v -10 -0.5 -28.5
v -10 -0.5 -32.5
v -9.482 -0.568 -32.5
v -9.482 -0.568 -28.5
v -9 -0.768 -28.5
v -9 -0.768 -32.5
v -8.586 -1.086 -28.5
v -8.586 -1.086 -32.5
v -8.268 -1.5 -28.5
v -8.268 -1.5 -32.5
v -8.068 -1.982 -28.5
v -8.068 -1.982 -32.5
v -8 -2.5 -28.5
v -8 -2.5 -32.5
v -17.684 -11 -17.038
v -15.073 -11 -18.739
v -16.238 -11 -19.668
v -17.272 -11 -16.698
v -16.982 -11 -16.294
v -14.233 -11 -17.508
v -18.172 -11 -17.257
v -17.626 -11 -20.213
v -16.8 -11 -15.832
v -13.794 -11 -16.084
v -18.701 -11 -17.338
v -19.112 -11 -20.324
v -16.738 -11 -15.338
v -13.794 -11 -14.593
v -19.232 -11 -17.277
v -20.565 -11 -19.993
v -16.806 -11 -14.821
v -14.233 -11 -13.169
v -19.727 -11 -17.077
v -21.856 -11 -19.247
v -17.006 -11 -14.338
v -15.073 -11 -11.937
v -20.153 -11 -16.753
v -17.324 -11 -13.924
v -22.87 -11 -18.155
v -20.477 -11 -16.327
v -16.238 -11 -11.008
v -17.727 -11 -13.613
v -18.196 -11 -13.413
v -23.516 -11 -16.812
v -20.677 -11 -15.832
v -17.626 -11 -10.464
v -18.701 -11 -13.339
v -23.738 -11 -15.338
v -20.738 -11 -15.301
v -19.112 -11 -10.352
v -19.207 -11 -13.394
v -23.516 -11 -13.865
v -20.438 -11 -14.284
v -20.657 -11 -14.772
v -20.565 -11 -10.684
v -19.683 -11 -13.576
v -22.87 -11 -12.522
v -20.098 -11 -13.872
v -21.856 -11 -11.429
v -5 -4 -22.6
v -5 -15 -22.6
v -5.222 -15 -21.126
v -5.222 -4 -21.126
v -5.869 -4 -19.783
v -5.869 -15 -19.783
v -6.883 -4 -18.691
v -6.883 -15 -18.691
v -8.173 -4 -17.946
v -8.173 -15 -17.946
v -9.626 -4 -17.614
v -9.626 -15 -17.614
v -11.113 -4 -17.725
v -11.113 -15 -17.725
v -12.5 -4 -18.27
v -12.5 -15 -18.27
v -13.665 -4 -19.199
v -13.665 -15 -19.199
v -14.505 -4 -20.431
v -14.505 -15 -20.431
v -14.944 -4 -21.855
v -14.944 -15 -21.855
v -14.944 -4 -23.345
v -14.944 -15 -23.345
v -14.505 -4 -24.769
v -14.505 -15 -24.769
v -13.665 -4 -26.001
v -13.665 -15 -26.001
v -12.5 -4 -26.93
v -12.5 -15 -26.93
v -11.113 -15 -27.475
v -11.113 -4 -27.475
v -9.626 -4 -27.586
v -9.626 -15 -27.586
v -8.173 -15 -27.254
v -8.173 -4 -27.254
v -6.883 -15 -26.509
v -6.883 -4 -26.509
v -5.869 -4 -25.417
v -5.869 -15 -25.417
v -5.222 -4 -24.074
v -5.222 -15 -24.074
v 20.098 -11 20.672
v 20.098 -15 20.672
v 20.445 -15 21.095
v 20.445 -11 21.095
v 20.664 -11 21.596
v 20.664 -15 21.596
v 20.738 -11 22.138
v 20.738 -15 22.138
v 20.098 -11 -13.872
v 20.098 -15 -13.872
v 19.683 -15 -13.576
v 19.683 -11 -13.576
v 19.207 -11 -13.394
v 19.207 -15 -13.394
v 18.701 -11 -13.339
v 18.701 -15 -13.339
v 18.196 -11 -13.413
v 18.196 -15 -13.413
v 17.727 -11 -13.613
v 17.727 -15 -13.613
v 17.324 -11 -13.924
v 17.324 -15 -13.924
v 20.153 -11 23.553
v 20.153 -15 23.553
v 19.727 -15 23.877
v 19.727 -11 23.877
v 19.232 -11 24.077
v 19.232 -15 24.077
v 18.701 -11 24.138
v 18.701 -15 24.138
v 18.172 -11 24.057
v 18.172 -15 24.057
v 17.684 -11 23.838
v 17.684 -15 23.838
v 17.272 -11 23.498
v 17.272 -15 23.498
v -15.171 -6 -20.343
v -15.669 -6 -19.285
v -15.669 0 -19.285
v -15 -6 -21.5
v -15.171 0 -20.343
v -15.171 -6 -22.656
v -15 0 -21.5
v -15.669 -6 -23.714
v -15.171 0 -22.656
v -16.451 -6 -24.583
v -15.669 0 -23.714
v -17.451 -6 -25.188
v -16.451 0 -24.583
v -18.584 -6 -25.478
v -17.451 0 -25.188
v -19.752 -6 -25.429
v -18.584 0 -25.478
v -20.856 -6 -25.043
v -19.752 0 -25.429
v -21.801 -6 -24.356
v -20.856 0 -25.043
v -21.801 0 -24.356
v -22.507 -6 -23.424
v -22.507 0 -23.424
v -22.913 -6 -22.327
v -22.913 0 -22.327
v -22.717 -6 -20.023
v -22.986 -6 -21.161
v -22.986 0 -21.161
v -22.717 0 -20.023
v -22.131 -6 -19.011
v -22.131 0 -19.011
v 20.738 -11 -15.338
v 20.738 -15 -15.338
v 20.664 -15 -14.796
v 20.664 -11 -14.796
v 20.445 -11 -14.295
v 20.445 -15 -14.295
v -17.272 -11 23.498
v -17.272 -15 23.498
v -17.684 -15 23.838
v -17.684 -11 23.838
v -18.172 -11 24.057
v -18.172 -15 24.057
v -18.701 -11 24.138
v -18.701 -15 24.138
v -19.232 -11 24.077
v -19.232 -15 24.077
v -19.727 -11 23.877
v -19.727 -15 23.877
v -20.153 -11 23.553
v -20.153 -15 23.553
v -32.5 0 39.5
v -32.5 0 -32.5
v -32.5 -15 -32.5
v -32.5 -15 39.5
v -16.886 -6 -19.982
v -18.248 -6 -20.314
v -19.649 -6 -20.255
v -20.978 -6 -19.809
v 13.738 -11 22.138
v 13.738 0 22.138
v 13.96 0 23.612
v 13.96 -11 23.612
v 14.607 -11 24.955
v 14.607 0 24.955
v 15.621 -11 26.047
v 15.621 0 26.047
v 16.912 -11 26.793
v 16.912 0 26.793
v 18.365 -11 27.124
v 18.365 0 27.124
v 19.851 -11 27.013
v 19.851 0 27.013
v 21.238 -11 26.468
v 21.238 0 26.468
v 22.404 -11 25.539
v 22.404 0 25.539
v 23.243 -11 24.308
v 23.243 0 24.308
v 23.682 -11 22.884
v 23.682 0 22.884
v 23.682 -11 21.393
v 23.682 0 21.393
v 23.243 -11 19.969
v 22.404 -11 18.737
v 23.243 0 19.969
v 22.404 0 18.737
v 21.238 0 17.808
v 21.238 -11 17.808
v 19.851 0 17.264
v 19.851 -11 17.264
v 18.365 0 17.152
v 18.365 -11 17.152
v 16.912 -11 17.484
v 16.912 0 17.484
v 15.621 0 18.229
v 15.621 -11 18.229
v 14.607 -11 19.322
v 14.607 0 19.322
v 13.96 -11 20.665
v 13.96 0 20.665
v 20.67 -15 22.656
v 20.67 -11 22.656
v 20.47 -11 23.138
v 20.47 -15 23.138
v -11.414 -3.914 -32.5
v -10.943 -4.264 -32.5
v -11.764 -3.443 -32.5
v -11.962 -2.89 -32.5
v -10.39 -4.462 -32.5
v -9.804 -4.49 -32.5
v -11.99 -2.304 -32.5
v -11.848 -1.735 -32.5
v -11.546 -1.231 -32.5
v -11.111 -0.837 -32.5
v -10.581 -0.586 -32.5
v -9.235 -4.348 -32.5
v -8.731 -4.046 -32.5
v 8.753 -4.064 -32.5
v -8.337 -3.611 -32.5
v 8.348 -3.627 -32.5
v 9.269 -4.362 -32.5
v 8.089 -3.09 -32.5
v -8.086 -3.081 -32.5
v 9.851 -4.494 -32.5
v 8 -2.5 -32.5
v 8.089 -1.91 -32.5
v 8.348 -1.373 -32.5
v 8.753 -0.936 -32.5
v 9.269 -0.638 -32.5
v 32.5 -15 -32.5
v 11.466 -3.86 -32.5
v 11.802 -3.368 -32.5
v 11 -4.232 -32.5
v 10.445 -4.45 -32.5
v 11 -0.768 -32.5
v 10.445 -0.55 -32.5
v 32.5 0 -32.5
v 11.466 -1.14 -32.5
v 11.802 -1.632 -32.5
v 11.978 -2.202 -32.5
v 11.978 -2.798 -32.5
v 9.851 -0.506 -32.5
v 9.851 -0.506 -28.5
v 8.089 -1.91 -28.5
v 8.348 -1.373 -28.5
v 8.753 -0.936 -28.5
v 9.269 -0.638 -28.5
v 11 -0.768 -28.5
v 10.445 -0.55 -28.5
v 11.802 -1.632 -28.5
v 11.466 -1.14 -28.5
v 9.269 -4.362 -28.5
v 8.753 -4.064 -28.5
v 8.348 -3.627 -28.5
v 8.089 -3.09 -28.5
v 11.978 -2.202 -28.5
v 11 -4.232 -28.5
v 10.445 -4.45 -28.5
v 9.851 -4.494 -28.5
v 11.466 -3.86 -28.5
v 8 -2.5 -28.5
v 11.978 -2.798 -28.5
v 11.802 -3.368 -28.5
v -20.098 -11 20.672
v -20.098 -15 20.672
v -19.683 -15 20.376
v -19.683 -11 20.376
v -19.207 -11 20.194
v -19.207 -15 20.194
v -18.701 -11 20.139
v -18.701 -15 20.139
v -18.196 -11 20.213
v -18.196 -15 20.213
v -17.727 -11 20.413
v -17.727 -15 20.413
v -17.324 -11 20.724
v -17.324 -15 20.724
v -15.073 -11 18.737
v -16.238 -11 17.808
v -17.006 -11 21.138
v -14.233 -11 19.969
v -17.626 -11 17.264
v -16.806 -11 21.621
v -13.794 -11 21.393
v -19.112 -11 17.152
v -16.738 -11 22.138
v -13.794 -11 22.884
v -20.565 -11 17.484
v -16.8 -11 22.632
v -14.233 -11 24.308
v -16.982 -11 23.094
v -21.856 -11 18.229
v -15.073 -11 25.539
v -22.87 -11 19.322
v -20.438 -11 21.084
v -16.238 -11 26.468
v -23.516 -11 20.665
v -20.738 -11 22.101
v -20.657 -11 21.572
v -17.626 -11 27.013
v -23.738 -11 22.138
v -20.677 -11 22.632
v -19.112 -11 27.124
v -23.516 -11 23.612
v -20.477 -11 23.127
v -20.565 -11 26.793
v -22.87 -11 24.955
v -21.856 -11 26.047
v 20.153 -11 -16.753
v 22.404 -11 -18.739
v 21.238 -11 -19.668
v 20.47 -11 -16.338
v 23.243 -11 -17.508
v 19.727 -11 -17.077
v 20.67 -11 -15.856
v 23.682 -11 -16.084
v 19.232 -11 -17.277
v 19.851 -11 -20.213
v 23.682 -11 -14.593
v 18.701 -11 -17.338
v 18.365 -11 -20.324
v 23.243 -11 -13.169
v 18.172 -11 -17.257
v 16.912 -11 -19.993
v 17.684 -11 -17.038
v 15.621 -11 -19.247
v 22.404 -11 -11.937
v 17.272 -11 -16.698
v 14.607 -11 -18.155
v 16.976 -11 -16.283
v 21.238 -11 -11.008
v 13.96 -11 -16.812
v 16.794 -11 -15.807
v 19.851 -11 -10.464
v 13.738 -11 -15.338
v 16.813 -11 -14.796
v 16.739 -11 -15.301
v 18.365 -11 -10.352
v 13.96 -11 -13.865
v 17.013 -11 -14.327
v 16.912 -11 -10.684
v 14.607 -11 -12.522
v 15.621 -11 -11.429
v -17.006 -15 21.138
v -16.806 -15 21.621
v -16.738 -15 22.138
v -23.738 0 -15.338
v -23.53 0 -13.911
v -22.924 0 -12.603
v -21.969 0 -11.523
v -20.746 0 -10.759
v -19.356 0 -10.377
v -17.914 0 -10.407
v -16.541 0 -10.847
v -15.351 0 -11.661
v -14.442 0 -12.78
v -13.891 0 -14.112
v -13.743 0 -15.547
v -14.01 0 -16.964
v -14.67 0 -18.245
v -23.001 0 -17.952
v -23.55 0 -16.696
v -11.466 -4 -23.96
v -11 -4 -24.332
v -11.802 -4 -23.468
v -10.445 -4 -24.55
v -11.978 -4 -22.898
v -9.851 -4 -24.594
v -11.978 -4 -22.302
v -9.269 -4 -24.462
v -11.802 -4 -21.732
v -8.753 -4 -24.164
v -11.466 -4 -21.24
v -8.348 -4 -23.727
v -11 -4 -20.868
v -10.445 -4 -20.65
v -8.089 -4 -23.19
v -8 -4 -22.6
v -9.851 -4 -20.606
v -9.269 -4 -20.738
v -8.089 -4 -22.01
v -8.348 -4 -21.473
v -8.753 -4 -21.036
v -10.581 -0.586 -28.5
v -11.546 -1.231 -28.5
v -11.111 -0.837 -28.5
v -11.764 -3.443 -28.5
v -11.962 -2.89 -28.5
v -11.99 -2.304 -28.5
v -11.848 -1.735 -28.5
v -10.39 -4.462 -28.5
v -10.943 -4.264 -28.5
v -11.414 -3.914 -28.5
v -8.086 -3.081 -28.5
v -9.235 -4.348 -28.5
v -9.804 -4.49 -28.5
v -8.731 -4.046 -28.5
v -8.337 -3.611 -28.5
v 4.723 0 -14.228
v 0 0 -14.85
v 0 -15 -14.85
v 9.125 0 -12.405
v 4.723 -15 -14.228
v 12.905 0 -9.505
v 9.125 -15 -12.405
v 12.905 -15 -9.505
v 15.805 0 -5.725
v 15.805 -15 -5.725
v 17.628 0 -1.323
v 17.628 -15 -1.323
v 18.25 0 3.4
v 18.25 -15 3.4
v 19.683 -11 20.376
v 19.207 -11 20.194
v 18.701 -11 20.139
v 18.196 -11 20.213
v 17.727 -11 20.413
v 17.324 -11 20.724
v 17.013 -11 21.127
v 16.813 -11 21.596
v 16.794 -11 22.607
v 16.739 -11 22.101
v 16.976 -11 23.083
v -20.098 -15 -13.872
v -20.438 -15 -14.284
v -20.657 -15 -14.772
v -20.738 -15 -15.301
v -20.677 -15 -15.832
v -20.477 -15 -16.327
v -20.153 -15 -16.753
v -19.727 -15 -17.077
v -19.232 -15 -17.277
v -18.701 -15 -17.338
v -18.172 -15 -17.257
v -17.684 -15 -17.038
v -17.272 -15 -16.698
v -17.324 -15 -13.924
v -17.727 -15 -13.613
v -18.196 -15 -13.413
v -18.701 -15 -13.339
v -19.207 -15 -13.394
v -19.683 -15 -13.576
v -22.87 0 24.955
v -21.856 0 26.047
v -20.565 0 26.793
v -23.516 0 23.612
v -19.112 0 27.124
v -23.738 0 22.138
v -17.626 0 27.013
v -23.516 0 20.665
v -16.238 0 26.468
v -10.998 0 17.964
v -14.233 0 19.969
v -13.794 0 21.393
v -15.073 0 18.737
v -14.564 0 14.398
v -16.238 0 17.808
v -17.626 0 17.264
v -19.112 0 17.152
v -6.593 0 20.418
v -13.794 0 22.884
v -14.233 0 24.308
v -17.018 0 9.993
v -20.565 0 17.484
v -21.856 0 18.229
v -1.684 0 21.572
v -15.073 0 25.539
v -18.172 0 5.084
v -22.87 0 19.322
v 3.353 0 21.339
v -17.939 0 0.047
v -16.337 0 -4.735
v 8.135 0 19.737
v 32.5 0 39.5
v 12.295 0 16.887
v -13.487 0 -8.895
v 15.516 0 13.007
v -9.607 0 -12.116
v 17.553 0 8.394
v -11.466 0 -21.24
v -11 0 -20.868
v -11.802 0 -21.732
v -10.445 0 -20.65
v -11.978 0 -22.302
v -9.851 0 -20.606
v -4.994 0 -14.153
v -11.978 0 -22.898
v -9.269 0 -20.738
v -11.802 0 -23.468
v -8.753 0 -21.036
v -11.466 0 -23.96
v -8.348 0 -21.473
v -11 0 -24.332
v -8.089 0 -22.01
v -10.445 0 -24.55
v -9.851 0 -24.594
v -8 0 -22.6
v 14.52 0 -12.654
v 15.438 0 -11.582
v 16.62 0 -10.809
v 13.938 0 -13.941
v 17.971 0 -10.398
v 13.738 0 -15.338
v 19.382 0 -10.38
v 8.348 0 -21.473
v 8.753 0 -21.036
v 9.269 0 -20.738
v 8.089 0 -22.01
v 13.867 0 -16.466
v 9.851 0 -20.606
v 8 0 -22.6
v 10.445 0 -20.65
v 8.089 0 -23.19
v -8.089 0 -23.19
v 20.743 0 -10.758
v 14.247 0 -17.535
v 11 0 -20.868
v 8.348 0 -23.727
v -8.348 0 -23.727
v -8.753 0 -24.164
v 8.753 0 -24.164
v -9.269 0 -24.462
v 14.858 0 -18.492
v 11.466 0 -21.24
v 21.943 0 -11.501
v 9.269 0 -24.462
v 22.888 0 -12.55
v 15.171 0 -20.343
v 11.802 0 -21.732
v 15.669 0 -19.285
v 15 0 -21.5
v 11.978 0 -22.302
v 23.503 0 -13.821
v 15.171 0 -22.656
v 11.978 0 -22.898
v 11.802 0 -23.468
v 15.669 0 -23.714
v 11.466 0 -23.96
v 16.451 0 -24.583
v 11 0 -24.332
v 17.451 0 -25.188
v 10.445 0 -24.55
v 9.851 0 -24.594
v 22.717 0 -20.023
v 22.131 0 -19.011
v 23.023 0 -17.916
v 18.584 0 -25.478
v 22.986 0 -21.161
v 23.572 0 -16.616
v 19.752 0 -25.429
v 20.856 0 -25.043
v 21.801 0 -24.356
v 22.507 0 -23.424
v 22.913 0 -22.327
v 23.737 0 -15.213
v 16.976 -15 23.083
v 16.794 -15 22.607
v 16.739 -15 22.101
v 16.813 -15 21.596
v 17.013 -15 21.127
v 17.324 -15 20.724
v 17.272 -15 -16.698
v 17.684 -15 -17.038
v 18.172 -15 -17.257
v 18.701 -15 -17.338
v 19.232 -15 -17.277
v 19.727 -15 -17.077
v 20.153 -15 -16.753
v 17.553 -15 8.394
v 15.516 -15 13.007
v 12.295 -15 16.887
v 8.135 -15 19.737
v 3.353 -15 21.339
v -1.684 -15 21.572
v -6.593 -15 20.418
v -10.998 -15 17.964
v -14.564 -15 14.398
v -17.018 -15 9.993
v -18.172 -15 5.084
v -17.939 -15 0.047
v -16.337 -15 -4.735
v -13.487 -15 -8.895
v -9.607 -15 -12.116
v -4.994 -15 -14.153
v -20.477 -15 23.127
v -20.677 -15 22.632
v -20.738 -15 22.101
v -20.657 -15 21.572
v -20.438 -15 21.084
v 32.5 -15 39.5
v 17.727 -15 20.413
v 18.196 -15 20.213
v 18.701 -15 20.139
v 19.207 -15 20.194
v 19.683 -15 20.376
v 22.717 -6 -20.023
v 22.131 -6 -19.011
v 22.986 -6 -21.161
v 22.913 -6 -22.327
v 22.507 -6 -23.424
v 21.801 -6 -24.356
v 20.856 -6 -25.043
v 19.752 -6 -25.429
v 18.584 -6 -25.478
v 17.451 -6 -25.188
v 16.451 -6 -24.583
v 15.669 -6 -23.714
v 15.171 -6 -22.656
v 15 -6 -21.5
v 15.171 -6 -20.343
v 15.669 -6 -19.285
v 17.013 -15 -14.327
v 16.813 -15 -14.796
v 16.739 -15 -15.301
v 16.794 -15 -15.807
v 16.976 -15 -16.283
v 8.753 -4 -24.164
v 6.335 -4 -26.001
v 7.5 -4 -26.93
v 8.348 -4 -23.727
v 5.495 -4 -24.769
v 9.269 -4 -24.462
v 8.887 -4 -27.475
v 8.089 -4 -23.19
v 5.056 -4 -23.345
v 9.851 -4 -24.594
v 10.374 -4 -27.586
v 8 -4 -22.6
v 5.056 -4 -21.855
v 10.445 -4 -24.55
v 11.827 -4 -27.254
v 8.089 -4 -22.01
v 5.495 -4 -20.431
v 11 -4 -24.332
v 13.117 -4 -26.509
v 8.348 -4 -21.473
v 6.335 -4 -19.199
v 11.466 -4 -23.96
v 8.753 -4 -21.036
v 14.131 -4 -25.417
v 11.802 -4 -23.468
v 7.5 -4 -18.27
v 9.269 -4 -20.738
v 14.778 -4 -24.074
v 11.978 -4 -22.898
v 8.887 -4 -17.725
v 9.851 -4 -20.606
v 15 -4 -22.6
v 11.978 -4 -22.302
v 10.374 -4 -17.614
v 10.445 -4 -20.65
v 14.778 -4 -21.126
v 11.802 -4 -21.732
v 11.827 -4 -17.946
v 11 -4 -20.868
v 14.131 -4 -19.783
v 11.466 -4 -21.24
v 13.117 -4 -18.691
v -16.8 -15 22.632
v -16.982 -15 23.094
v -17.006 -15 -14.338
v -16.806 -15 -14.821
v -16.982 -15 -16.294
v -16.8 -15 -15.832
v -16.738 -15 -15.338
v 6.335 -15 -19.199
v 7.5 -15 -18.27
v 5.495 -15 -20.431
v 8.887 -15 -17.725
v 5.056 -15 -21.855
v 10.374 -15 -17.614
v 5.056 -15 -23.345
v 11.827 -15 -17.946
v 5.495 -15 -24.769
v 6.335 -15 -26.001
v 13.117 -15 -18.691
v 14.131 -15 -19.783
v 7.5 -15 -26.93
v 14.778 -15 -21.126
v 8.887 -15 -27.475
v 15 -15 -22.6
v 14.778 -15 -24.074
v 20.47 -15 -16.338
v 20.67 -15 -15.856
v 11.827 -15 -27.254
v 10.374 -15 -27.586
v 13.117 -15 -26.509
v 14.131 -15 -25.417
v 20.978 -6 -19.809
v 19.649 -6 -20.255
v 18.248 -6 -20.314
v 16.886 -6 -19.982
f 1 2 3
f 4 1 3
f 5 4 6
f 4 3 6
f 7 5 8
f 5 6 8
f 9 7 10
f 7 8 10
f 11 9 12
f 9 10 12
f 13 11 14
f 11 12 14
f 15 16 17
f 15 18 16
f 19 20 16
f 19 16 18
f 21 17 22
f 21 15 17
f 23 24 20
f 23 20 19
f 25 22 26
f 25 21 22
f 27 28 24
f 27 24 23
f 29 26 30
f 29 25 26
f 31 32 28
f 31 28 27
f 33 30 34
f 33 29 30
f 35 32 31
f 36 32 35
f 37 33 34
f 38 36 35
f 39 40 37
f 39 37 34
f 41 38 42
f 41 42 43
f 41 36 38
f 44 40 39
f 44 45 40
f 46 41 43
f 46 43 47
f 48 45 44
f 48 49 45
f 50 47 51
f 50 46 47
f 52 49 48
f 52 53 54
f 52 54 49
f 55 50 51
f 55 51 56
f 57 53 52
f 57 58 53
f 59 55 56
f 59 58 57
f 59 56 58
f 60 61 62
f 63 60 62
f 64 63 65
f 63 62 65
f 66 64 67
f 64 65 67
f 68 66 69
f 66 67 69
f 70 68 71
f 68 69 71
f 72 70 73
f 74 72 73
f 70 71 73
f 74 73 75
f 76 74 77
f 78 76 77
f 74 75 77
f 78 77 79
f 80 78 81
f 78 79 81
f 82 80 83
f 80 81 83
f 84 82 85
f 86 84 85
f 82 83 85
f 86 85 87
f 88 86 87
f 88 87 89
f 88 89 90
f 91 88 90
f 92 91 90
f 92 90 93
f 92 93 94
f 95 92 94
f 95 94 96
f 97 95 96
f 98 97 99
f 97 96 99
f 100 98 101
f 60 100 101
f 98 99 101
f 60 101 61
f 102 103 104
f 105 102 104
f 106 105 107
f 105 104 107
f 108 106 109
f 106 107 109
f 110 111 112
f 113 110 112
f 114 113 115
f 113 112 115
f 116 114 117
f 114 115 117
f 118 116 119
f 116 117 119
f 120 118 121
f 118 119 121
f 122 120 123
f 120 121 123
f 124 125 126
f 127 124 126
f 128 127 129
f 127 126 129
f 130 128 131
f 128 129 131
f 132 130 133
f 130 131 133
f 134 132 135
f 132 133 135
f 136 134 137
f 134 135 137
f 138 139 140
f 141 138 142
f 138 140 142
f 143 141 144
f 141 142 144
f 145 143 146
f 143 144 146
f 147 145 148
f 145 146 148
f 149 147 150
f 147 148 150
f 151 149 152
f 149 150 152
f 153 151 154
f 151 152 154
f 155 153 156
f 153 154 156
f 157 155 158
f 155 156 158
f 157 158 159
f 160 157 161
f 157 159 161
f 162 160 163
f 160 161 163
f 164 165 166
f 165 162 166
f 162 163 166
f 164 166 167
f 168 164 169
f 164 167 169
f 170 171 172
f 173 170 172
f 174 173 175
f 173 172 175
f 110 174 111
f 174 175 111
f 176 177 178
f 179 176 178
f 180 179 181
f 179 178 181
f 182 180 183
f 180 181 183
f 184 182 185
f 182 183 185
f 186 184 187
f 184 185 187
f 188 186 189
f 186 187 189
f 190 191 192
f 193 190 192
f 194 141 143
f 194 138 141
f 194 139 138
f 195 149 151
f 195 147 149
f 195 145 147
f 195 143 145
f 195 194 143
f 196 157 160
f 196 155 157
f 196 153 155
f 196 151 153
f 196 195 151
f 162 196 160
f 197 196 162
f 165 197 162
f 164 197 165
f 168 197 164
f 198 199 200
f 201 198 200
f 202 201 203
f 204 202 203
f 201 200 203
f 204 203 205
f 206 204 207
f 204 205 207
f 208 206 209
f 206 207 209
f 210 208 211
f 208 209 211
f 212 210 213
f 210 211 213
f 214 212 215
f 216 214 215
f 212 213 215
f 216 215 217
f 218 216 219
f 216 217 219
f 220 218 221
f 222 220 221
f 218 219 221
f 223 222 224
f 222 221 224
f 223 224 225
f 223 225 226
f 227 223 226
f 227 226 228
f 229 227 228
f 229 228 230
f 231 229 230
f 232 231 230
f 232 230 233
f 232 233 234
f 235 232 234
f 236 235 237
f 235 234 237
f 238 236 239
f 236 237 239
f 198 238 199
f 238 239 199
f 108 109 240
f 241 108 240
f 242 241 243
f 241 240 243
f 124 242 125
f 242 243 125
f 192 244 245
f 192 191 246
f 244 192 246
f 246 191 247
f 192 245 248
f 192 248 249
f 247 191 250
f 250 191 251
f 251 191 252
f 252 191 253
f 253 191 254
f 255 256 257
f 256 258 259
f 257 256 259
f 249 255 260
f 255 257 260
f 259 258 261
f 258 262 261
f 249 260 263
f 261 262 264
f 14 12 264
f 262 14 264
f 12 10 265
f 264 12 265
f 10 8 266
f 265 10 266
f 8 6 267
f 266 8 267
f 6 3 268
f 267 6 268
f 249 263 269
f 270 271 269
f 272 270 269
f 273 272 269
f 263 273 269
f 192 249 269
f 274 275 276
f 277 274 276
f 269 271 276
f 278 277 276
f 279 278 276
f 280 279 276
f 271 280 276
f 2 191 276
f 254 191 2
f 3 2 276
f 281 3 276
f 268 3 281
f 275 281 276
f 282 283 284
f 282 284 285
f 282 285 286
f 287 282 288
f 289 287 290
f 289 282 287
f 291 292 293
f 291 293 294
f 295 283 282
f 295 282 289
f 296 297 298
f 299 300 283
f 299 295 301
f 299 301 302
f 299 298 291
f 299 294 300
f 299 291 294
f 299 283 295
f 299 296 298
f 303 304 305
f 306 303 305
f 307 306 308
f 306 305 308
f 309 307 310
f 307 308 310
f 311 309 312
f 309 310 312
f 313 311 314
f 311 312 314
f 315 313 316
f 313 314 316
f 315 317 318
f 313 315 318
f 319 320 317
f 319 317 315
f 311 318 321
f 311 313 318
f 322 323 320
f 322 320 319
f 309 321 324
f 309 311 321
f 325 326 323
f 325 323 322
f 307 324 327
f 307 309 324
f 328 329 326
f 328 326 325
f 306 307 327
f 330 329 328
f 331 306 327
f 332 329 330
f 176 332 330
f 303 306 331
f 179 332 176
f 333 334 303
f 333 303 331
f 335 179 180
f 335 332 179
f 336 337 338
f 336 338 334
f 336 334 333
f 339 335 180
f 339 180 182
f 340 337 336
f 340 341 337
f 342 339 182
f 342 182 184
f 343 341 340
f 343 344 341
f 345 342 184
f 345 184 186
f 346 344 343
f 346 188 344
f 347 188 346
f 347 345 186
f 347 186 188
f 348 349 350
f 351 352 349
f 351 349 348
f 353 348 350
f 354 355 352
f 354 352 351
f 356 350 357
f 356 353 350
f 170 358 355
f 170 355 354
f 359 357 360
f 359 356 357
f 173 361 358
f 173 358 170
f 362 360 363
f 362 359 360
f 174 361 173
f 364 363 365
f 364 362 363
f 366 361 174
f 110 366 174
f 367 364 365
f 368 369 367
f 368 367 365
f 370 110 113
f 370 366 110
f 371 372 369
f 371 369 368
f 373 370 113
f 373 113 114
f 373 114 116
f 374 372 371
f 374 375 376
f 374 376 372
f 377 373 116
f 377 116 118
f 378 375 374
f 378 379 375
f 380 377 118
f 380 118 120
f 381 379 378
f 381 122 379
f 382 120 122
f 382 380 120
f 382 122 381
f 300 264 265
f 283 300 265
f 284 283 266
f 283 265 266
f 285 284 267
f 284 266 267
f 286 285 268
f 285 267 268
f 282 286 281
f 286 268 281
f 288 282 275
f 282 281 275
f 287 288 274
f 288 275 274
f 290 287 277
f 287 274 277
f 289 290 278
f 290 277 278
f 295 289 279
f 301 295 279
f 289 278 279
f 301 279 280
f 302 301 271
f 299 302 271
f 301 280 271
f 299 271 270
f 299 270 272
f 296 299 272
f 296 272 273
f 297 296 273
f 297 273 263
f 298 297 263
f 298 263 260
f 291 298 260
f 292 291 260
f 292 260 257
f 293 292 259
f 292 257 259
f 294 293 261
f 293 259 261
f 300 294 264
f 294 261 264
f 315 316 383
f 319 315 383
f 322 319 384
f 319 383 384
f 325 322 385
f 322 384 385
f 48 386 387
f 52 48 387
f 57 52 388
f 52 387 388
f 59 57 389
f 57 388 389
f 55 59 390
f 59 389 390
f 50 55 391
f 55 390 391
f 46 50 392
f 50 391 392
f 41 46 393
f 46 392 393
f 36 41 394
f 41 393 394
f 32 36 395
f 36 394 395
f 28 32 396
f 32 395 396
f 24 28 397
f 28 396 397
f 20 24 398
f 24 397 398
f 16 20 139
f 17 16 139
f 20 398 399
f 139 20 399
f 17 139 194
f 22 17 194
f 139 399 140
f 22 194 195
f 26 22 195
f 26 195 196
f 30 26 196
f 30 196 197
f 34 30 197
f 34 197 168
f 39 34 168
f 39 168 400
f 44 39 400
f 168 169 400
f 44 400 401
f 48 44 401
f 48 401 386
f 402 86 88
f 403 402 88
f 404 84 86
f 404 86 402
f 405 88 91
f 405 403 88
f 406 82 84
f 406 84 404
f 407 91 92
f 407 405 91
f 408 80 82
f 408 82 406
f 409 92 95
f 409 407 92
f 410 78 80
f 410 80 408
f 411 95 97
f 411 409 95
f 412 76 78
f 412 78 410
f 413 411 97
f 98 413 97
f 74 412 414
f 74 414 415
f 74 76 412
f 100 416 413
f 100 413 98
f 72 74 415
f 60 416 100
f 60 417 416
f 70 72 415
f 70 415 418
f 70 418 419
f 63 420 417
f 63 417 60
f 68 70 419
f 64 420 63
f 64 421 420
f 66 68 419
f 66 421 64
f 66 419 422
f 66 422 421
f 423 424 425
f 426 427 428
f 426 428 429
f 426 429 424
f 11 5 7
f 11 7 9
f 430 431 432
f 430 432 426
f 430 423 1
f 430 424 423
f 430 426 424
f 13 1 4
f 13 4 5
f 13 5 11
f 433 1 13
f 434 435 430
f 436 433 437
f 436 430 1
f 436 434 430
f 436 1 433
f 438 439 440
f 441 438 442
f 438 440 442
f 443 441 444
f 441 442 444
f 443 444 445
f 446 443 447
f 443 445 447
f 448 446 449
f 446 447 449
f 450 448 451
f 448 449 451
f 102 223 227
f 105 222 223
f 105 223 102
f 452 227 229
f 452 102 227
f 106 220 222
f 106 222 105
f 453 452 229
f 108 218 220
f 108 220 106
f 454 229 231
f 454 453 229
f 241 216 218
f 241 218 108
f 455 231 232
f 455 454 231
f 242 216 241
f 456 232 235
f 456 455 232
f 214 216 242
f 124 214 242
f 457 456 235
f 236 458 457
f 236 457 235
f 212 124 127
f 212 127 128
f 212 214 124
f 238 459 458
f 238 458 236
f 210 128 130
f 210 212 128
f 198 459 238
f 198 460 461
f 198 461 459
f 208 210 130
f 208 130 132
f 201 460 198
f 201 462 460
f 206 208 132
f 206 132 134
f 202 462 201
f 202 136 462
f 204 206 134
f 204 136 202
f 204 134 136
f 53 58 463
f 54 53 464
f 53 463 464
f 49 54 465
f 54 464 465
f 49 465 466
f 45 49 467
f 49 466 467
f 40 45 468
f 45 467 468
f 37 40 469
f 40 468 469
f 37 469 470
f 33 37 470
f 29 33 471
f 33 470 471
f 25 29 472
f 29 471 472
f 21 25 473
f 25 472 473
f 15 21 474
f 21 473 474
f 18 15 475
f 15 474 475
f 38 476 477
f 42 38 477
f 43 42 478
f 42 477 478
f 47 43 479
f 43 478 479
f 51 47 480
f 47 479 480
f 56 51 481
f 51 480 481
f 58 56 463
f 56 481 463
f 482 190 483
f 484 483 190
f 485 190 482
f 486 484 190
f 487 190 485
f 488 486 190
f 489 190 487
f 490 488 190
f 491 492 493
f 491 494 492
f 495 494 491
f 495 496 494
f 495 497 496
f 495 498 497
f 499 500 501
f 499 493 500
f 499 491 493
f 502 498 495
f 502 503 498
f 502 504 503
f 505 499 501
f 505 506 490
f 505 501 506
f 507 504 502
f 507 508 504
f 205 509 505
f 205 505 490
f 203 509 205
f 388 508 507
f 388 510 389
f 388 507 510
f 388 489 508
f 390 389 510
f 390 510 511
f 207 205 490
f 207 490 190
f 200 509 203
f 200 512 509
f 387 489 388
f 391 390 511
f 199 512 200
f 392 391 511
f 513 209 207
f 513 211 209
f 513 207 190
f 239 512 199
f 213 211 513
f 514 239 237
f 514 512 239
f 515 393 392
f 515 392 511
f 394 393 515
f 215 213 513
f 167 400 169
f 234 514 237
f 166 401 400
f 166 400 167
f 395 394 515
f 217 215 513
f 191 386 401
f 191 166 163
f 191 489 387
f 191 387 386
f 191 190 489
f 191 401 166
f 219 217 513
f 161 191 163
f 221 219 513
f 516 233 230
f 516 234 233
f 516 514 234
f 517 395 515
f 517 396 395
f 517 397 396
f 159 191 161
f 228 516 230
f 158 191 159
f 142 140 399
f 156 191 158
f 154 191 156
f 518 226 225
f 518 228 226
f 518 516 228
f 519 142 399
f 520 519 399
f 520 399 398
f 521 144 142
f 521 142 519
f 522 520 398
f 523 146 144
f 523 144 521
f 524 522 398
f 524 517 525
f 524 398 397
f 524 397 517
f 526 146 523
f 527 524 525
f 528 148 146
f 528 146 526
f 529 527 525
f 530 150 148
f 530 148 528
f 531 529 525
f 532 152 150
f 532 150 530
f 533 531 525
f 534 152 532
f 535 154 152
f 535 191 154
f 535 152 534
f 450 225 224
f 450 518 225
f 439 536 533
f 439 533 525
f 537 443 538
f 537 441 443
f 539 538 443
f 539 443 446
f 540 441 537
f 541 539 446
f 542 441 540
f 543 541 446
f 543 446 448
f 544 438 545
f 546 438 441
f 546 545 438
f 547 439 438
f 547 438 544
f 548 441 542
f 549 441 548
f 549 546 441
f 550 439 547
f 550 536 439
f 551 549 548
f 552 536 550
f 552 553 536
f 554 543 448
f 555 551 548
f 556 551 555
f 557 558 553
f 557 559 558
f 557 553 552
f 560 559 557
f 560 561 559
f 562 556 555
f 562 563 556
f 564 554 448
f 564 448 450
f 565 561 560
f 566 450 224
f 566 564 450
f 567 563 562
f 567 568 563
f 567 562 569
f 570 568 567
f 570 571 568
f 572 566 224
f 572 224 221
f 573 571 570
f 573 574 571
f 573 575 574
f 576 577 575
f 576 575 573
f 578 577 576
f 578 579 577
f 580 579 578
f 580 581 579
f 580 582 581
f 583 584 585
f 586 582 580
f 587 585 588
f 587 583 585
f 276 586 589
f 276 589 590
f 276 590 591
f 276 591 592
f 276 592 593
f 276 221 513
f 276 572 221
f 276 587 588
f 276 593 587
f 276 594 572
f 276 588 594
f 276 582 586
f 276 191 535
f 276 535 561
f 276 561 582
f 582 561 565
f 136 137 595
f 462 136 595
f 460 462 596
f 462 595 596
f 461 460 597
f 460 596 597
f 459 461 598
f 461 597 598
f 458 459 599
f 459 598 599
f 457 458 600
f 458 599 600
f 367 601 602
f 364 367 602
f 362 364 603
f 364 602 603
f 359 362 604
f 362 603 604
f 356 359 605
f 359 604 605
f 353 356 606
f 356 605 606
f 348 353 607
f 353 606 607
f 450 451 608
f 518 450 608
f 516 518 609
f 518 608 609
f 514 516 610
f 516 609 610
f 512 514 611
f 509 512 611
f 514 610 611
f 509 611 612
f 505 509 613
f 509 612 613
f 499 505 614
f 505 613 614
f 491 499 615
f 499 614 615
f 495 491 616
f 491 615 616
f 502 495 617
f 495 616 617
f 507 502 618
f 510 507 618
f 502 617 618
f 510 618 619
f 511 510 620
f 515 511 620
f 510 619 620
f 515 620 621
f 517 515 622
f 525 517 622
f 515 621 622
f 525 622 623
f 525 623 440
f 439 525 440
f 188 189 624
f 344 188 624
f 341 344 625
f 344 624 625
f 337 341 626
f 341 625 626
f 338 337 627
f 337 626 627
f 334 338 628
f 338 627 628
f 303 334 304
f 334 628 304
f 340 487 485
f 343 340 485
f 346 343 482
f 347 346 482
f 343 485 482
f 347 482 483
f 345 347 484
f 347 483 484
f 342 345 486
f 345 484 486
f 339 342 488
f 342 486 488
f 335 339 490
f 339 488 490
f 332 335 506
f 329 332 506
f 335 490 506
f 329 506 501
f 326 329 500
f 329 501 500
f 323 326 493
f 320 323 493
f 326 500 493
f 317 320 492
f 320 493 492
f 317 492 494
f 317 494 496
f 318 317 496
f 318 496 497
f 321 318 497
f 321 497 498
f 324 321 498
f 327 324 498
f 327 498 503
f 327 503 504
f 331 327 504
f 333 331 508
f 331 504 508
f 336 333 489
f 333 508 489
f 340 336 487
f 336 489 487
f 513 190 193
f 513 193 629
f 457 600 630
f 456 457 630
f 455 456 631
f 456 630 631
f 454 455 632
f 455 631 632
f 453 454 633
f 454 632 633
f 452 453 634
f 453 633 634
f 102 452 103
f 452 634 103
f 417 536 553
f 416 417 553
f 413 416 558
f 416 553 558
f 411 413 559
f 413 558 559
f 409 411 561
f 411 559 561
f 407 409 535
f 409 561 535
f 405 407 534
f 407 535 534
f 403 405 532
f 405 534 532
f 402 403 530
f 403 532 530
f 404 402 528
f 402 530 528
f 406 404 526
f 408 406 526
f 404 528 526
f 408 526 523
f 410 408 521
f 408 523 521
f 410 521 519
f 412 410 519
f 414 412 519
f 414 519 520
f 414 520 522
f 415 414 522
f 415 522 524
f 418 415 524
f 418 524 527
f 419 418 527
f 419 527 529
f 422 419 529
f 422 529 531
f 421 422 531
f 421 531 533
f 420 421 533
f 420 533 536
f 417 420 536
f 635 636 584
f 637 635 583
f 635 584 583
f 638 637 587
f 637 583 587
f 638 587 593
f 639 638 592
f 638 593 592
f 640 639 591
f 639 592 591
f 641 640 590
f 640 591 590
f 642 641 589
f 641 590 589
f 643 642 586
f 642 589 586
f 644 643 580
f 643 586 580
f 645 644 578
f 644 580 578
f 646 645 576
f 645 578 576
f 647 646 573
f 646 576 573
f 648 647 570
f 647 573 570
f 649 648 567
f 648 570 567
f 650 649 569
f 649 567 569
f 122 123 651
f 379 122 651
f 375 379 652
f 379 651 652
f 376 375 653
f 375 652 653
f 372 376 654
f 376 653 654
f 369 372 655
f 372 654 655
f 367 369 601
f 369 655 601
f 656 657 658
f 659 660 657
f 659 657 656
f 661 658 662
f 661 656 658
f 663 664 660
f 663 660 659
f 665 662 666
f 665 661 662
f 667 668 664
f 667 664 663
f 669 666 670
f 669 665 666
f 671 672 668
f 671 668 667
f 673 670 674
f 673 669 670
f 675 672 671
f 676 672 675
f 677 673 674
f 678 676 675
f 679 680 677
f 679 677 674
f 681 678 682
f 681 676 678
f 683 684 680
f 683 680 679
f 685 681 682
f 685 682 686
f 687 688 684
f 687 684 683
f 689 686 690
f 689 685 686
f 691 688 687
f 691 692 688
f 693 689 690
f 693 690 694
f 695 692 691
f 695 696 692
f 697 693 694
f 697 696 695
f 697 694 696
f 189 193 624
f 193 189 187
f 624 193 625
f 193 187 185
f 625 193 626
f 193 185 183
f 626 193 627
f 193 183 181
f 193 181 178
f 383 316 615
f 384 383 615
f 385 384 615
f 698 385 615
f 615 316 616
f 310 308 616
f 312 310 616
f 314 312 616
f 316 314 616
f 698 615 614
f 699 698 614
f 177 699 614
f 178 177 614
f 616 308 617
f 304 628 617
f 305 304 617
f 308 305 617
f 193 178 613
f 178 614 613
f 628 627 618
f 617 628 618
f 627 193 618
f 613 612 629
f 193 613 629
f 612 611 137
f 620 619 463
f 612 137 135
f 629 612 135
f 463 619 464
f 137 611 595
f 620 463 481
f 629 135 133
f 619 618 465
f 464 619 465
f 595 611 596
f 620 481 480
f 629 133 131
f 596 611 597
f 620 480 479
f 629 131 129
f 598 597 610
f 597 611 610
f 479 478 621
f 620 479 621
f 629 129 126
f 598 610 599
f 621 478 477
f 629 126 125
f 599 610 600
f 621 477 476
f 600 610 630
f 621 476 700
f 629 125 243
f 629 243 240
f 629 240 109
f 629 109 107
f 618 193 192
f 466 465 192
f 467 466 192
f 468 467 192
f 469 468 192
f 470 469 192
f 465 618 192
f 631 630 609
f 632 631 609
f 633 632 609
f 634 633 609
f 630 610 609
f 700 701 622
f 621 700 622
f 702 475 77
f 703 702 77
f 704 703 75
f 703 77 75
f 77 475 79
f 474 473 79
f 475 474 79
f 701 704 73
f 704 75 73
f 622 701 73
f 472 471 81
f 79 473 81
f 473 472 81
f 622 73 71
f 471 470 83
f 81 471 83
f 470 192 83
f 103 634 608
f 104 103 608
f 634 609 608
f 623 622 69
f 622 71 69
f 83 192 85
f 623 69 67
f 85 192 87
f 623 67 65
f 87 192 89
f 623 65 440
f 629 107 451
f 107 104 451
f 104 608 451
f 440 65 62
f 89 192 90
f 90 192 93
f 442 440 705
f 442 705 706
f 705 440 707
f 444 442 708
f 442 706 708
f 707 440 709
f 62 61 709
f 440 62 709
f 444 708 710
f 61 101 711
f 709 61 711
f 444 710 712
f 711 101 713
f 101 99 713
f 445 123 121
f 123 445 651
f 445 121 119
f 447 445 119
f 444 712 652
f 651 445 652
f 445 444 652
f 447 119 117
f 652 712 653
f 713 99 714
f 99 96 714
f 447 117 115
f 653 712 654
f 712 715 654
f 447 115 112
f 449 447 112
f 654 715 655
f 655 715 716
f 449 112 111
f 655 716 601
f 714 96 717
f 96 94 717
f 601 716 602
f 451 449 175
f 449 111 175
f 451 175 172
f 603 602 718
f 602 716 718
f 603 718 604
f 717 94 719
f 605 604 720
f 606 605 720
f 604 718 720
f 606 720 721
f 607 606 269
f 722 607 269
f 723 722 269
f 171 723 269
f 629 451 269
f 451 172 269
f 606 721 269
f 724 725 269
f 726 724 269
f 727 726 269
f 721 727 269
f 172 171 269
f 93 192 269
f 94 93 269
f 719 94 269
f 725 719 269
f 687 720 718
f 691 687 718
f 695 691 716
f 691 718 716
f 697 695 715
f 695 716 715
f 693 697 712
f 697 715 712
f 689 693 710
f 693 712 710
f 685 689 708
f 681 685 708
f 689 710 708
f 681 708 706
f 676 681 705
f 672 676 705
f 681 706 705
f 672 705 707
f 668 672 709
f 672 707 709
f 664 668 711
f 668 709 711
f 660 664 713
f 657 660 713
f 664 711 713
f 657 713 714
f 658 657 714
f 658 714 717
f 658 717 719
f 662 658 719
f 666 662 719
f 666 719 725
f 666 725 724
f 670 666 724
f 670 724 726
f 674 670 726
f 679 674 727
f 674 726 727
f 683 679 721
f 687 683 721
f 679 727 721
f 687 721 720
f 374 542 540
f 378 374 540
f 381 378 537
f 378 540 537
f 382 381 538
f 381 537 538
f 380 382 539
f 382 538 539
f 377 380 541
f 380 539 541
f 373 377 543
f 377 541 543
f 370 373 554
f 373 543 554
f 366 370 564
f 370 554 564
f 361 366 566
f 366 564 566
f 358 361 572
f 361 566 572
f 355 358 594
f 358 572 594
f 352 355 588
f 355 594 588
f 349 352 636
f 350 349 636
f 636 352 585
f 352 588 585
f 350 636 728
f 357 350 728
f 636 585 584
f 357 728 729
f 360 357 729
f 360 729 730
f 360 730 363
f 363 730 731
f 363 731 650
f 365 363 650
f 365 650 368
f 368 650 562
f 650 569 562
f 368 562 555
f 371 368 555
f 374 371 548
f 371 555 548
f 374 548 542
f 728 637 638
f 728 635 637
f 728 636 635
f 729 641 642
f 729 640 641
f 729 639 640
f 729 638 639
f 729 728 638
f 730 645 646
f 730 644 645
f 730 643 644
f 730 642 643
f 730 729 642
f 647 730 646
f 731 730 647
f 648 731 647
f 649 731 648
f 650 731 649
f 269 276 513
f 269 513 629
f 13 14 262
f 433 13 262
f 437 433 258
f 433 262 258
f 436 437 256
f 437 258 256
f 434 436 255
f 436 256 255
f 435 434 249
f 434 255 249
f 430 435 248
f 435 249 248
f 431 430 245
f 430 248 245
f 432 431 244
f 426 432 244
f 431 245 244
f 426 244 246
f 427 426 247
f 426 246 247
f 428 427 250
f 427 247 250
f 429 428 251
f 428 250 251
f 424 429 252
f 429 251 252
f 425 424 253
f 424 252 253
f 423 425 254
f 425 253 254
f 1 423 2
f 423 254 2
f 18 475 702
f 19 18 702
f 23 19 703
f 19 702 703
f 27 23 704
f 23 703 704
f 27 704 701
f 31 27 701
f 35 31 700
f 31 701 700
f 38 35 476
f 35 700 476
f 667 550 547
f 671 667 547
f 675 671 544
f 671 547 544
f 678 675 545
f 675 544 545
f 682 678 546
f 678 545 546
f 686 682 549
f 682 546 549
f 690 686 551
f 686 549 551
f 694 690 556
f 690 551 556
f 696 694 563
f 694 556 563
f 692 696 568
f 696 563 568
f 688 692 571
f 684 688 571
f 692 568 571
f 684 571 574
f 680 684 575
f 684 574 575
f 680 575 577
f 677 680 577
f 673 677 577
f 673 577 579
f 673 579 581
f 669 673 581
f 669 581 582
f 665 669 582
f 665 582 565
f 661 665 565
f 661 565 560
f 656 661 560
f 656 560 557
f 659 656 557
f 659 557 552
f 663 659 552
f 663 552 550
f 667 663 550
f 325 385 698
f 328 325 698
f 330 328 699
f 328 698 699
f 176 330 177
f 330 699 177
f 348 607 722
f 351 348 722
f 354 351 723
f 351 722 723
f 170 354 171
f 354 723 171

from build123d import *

# Parameters (mm, degrees)
F0_W      = 65
F0_H      = 65
F1_DEPTH  = 15
F3_DEPTH  = 15
F5_DEPTH  = 25
F6_R      = 5
F7_DEPTH  = 11
F8_R      = 2
F9_DEPTH  = 25
F10_R     = 5
F11_DEPTH = 11
F13_DEPTH = 4
F14_R     = 4
F15_DEPTH = 6
F16_DEPTH = 7


# Not quite as in the source:
# - the program builds the solid bodies; features that only make, move or delete a surface that nothing else refers to are left out


with BuildPart() as f1:
    # F0 (on Front) → F1 (new body)
    with BuildSketch(Plane.XZ):
        Rectangle(F0_W, F0_H)
    extrude(amount=F1_DEPTH)

    # F2 (on face) → F3 (cut)
    with BuildSketch(Plane.XZ.offset(15)):
        with BuildLine():
            ThreePointArc((18.25, 3.4), (-12.9046987567, 16.3046987567), (0, -14.85))
            ThreePointArc((0, -14.85), (12.9046987567, -9.5046987567), (18.25, 3.4))
        make_face()
    extrude(amount=-F3_DEPTH, mode=Mode.SUBTRACT)

    # F4 (on face) → F5 (cut)
    with BuildSketch(Plane.XZ.offset(15)):
        with BuildLine():
            ThreePointArc((-20.0981694395, 20.6717568643), (-19.4320900923, 21.4178765299), (-18.7383297014, 22.1383297014))
            Line((-18.7383297014, 22.1383297014), (-20.1525432638, 23.5525432638))
            ThreePointArc((-20.1525432638, 23.5525432638), (-20.7379735443, 22.1005871312), (-20.0981694395, 20.6717568643))
        make_face()
        with BuildLine():
            ThreePointArc((18.7383297014, 22.1383297014), (19.4320900923, 21.4178765299), (20.0981694395, 20.6717568643))
            ThreePointArc((20.0981694395, 20.6717568643), (20.5713162639, 21.338229544), (20.7383297014, 22.1383297014))
            ThreePointArc((20.7383297014, 22.1383297014), (20.5860887665, 22.9036965662), (20.1525432638, 23.5525432638))
            Line((20.1525432638, 23.5525432638), (18.7383297014, 22.1383297014))
        make_face()
        with BuildLine():
            Line((17.3241161391, 20.7241161391), (18.7383297014, 22.1383297014))
            ThreePointArc((18.7383297014, 22.1383297014), (18.0178765299, 22.8320900923), (17.2717568643, 23.4981694395))
            ThreePointArc((17.2717568643, 23.4981694395), (16.7386858586, 22.1005871312), (17.3241161391, 20.7241161391))
        make_face()
        with BuildLine():
            ThreePointArc((17.2717568643, 23.4981694395), (18.0178765299, 22.8320900923), (18.7383297014, 22.1383297014))
            Line((18.7383297014, 22.1383297014), (20.1525432638, 23.5525432638))
            ThreePointArc((20.1525432638, 23.5525432638), (18.7005871312, 24.1379735443), (17.2717568643, 23.4981694395))
        make_face()
        with BuildLine():
            ThreePointArc((17.3241161391, 20.7241161391), (18.7005871312, 20.1386858586), (20.0981694395, 20.6717568643))
            ThreePointArc((20.0981694395, 20.6717568643), (19.4320900923, 21.4178765299), (18.7383297014, 22.1383297014))
            Line((18.7383297014, 22.1383297014), (17.3241161391, 20.7241161391))
        make_face()
        with BuildLine():
            ThreePointArc((20.7383297014, -15.3383297014), (20.5713162639, -14.538229544), (20.0981694395, -13.8717568643))
            ThreePointArc((20.0981694395, -13.8717568643), (19.4320900923, -14.6178765299), (18.7383297014, -15.3383297014))
            Line((18.7383297014, -15.3383297014), (20.1525432638, -16.7525432638))
            ThreePointArc((20.1525432638, -16.7525432638), (20.5860887665, -16.1036965662), (20.7383297014, -15.3383297014))
        make_face()
        with BuildLine():
            ThreePointArc((18.7383297014, -15.3383297014), (19.4320900923, -14.6178765299), (20.0981694395, -13.8717568643))
            ThreePointArc((20.0981694395, -13.8717568643), (18.7005871312, -13.3386858586), (17.3241161391, -13.9241161391))
            Line((17.3241161391, -13.9241161391), (18.7383297014, -15.3383297014))
        make_face()
        with BuildLine():
            Line((20.1525432638, -16.7525432638), (18.7383297014, -15.3383297014))
            ThreePointArc((18.7383297014, -15.3383297014), (18.0178765299, -16.0320900923), (17.2717568643, -16.6981694395))
            ThreePointArc((17.2717568643, -16.6981694395), (18.7005871312, -17.3379735443), (20.1525432638, -16.7525432638))
        make_face()
        with BuildLine():
            ThreePointArc((17.2717568643, -16.6981694395), (18.0178765299, -16.0320900923), (18.7383297014, -15.3383297014))
            Line((18.7383297014, -15.3383297014), (17.3241161391, -13.9241161391))
            ThreePointArc((17.3241161391, -13.9241161391), (16.7386858586, -15.3005871312), (17.2717568643, -16.6981694395))
        make_face()
        with BuildLine():
            ThreePointArc((-18.7383297014, 22.1383297014), (-18.0178765299, 22.8320900923), (-17.2717568643, 23.4981694395))
            ThreePointArc((-17.2717568643, 23.4981694395), (-18.7005871312, 24.1379735443), (-20.1525432638, 23.5525432638))
            Line((-20.1525432638, 23.5525432638), (-18.7383297014, 22.1383297014))
        make_face()
        with BuildLine():
            ThreePointArc((-16.7383297014, 22.1383297014), (-16.8764562264, 22.8686906826), (-17.2717568643, 23.4981694395))
            ThreePointArc((-17.2717568643, 23.4981694395), (-18.0178765299, 22.8320900923), (-18.7383297014, 22.1383297014))
            Line((-18.7383297014, 22.1383297014), (-17.3241161391, 20.7241161391))
            ThreePointArc((-17.3241161391, 20.7241161391), (-16.8905706364, 21.3729628367), (-16.7383297014, 22.1383297014))
        make_face()
        with BuildLine():
            Line((-17.3241161391, 20.7241161391), (-18.7383297014, 22.1383297014))
            ThreePointArc((-18.7383297014, 22.1383297014), (-19.4320900923, 21.4178765299), (-20.0981694395, 20.6717568643))
            ThreePointArc((-20.0981694395, 20.6717568643), (-18.7005871312, 20.1386858586), (-17.3241161391, 20.7241161391))
        make_face()
        with BuildLine():
            ThreePointArc((-18.7383297014, -15.3383297014), (-18.0178765299, -16.0320900923), (-17.2717568643, -16.6981694395))
            ThreePointArc((-17.2717568643, -16.6981694395), (-16.8764562264, -16.0686906826), (-16.7383297014, -15.3383297014))
            ThreePointArc((-16.7383297014, -15.3383297014), (-16.8905706364, -14.5729628367), (-17.3241161391, -13.9241161391))
            Line((-17.3241161391, -13.9241161391), (-18.7383297014, -15.3383297014))
        make_face()
        with BuildLine():
            Line((-20.1525432638, -16.7525432638), (-18.7383297014, -15.3383297014))
            ThreePointArc((-18.7383297014, -15.3383297014), (-19.4320900923, -14.6178765299), (-20.0981694395, -13.8717568643))
            ThreePointArc((-20.0981694395, -13.8717568643), (-20.7379735443, -15.3005871312), (-20.1525432638, -16.7525432638))
        make_face()
        with BuildLine():
            ThreePointArc((-20.1525432638, -16.7525432638), (-18.7005871312, -17.3379735443), (-17.2717568643, -16.6981694395))
            ThreePointArc((-17.2717568643, -16.6981694395), (-18.0178765299, -16.0320900923), (-18.7383297014, -15.3383297014))
            Line((-18.7383297014, -15.3383297014), (-20.1525432638, -16.7525432638))
        make_face()
        with BuildLine():
            ThreePointArc((-20.0981694395, -13.8717568643), (-19.4320900923, -14.6178765299), (-18.7383297014, -15.3383297014))
            Line((-18.7383297014, -15.3383297014), (-17.3241161391, -13.9241161391))
            ThreePointArc((-17.3241161391, -13.9241161391), (-18.7005871312, -13.3386858586), (-20.0981694395, -13.8717568643))
        make_face()
    extrude(amount=-F5_DEPTH, mode=Mode.SUBTRACT)

    # F6 (on face) → F7 (cut)
    with BuildSketch(Plane(origin=(0, 0, 0), x_dir=(-1, 0, 0), z_dir=(0, 1, 0))):
        with Locations((-18.7383297014, 22.1383297014)):
            Circle(F6_R)
        with Locations((18.7383297014, 22.1383297014)):
            Circle(F6_R)
        with Locations((-18.7383297014, -15.3383297014)):
            Circle(F6_R)
        with Locations((18.7383297014, -15.3383297014)):
            Circle(F6_R)
    extrude(amount=-F7_DEPTH, mode=Mode.SUBTRACT)

    # F8 (on face) → F9 (cut)
    with BuildSketch(Plane(origin=(0, 0, 0), x_dir=(-1, 0, 0), z_dir=(0, 1, 0))):
        with BuildLine():
            ThreePointArc((12, -22.6), (10, -20.6), (8, -22.6))
            ThreePointArc((8, -22.6), (10, -24.6), (12, -22.6))
        make_face()
        with Locations((-10, -22.6)):
            Circle(F8_R)
    extrude(amount=-F9_DEPTH, mode=Mode.SUBTRACT)

    # F10 (on face) → F11 (cut)
    with BuildSketch(Plane.XZ.offset(15)):
        with Locations((-10, -22.6)):
            Circle(F10_R)
        with Locations((10, -22.6)):
            Circle(F10_R)
    extrude(amount=-F11_DEPTH, mode=Mode.SUBTRACT)

    # F12 (on face) → F13 (cut)
    with BuildSketch(Plane(origin=(0, 0, -32.5), x_dir=(1, 0, 0), z_dir=(0, 0, -1))):
        with BuildLine():
            ThreePointArc((-8, 2.5), (-11.4142135624, 3.9142135624), (-10, 0.5))
            Line((-10, 0.5), (-10, 2.5))
            Line((-10, 2.5), (-8, 2.5))
        make_face()
        with BuildLine():
            ThreePointArc((12, 2.5), (10, 4.5), (8, 2.5))
            ThreePointArc((8, 2.5), (10, 0.5), (12, 2.5))
        make_face()
        with BuildLine():
            Line((-10, 2.5), (-10, 0.5))
            ThreePointArc((-10, 0.5), (-8.5857864376, 1.0857864376), (-8, 2.5))
            Line((-8, 2.5), (-10, 2.5))
        make_face()
    extrude(amount=-F13_DEPTH, mode=Mode.SUBTRACT)

    # F14 (on face) → F15 (cut)
    with BuildSketch(Plane(origin=(0, 0, 0), x_dir=(-1, 0, 0), z_dir=(0, 1, 0))):
        with Locations((-19, -21.5)):
            Circle(F14_R)
        with BuildLine():
            ThreePointArc((23, -21.5), (19, -17.5), (15, -21.5))
            ThreePointArc((15, -21.5), (19, -25.5), (23, -21.5))
        make_face()
    extrude(amount=-F15_DEPTH, mode=Mode.SUBTRACT)

    # F16 (add): a face of the model
    f16_faces = [f1.faces().sort_by_distance(p)[0] for p in [
        (0, -7.5, 32.5),
    ]]
    extrude(f16_faces, amount=F16_DEPTH)


solid = f1.part
